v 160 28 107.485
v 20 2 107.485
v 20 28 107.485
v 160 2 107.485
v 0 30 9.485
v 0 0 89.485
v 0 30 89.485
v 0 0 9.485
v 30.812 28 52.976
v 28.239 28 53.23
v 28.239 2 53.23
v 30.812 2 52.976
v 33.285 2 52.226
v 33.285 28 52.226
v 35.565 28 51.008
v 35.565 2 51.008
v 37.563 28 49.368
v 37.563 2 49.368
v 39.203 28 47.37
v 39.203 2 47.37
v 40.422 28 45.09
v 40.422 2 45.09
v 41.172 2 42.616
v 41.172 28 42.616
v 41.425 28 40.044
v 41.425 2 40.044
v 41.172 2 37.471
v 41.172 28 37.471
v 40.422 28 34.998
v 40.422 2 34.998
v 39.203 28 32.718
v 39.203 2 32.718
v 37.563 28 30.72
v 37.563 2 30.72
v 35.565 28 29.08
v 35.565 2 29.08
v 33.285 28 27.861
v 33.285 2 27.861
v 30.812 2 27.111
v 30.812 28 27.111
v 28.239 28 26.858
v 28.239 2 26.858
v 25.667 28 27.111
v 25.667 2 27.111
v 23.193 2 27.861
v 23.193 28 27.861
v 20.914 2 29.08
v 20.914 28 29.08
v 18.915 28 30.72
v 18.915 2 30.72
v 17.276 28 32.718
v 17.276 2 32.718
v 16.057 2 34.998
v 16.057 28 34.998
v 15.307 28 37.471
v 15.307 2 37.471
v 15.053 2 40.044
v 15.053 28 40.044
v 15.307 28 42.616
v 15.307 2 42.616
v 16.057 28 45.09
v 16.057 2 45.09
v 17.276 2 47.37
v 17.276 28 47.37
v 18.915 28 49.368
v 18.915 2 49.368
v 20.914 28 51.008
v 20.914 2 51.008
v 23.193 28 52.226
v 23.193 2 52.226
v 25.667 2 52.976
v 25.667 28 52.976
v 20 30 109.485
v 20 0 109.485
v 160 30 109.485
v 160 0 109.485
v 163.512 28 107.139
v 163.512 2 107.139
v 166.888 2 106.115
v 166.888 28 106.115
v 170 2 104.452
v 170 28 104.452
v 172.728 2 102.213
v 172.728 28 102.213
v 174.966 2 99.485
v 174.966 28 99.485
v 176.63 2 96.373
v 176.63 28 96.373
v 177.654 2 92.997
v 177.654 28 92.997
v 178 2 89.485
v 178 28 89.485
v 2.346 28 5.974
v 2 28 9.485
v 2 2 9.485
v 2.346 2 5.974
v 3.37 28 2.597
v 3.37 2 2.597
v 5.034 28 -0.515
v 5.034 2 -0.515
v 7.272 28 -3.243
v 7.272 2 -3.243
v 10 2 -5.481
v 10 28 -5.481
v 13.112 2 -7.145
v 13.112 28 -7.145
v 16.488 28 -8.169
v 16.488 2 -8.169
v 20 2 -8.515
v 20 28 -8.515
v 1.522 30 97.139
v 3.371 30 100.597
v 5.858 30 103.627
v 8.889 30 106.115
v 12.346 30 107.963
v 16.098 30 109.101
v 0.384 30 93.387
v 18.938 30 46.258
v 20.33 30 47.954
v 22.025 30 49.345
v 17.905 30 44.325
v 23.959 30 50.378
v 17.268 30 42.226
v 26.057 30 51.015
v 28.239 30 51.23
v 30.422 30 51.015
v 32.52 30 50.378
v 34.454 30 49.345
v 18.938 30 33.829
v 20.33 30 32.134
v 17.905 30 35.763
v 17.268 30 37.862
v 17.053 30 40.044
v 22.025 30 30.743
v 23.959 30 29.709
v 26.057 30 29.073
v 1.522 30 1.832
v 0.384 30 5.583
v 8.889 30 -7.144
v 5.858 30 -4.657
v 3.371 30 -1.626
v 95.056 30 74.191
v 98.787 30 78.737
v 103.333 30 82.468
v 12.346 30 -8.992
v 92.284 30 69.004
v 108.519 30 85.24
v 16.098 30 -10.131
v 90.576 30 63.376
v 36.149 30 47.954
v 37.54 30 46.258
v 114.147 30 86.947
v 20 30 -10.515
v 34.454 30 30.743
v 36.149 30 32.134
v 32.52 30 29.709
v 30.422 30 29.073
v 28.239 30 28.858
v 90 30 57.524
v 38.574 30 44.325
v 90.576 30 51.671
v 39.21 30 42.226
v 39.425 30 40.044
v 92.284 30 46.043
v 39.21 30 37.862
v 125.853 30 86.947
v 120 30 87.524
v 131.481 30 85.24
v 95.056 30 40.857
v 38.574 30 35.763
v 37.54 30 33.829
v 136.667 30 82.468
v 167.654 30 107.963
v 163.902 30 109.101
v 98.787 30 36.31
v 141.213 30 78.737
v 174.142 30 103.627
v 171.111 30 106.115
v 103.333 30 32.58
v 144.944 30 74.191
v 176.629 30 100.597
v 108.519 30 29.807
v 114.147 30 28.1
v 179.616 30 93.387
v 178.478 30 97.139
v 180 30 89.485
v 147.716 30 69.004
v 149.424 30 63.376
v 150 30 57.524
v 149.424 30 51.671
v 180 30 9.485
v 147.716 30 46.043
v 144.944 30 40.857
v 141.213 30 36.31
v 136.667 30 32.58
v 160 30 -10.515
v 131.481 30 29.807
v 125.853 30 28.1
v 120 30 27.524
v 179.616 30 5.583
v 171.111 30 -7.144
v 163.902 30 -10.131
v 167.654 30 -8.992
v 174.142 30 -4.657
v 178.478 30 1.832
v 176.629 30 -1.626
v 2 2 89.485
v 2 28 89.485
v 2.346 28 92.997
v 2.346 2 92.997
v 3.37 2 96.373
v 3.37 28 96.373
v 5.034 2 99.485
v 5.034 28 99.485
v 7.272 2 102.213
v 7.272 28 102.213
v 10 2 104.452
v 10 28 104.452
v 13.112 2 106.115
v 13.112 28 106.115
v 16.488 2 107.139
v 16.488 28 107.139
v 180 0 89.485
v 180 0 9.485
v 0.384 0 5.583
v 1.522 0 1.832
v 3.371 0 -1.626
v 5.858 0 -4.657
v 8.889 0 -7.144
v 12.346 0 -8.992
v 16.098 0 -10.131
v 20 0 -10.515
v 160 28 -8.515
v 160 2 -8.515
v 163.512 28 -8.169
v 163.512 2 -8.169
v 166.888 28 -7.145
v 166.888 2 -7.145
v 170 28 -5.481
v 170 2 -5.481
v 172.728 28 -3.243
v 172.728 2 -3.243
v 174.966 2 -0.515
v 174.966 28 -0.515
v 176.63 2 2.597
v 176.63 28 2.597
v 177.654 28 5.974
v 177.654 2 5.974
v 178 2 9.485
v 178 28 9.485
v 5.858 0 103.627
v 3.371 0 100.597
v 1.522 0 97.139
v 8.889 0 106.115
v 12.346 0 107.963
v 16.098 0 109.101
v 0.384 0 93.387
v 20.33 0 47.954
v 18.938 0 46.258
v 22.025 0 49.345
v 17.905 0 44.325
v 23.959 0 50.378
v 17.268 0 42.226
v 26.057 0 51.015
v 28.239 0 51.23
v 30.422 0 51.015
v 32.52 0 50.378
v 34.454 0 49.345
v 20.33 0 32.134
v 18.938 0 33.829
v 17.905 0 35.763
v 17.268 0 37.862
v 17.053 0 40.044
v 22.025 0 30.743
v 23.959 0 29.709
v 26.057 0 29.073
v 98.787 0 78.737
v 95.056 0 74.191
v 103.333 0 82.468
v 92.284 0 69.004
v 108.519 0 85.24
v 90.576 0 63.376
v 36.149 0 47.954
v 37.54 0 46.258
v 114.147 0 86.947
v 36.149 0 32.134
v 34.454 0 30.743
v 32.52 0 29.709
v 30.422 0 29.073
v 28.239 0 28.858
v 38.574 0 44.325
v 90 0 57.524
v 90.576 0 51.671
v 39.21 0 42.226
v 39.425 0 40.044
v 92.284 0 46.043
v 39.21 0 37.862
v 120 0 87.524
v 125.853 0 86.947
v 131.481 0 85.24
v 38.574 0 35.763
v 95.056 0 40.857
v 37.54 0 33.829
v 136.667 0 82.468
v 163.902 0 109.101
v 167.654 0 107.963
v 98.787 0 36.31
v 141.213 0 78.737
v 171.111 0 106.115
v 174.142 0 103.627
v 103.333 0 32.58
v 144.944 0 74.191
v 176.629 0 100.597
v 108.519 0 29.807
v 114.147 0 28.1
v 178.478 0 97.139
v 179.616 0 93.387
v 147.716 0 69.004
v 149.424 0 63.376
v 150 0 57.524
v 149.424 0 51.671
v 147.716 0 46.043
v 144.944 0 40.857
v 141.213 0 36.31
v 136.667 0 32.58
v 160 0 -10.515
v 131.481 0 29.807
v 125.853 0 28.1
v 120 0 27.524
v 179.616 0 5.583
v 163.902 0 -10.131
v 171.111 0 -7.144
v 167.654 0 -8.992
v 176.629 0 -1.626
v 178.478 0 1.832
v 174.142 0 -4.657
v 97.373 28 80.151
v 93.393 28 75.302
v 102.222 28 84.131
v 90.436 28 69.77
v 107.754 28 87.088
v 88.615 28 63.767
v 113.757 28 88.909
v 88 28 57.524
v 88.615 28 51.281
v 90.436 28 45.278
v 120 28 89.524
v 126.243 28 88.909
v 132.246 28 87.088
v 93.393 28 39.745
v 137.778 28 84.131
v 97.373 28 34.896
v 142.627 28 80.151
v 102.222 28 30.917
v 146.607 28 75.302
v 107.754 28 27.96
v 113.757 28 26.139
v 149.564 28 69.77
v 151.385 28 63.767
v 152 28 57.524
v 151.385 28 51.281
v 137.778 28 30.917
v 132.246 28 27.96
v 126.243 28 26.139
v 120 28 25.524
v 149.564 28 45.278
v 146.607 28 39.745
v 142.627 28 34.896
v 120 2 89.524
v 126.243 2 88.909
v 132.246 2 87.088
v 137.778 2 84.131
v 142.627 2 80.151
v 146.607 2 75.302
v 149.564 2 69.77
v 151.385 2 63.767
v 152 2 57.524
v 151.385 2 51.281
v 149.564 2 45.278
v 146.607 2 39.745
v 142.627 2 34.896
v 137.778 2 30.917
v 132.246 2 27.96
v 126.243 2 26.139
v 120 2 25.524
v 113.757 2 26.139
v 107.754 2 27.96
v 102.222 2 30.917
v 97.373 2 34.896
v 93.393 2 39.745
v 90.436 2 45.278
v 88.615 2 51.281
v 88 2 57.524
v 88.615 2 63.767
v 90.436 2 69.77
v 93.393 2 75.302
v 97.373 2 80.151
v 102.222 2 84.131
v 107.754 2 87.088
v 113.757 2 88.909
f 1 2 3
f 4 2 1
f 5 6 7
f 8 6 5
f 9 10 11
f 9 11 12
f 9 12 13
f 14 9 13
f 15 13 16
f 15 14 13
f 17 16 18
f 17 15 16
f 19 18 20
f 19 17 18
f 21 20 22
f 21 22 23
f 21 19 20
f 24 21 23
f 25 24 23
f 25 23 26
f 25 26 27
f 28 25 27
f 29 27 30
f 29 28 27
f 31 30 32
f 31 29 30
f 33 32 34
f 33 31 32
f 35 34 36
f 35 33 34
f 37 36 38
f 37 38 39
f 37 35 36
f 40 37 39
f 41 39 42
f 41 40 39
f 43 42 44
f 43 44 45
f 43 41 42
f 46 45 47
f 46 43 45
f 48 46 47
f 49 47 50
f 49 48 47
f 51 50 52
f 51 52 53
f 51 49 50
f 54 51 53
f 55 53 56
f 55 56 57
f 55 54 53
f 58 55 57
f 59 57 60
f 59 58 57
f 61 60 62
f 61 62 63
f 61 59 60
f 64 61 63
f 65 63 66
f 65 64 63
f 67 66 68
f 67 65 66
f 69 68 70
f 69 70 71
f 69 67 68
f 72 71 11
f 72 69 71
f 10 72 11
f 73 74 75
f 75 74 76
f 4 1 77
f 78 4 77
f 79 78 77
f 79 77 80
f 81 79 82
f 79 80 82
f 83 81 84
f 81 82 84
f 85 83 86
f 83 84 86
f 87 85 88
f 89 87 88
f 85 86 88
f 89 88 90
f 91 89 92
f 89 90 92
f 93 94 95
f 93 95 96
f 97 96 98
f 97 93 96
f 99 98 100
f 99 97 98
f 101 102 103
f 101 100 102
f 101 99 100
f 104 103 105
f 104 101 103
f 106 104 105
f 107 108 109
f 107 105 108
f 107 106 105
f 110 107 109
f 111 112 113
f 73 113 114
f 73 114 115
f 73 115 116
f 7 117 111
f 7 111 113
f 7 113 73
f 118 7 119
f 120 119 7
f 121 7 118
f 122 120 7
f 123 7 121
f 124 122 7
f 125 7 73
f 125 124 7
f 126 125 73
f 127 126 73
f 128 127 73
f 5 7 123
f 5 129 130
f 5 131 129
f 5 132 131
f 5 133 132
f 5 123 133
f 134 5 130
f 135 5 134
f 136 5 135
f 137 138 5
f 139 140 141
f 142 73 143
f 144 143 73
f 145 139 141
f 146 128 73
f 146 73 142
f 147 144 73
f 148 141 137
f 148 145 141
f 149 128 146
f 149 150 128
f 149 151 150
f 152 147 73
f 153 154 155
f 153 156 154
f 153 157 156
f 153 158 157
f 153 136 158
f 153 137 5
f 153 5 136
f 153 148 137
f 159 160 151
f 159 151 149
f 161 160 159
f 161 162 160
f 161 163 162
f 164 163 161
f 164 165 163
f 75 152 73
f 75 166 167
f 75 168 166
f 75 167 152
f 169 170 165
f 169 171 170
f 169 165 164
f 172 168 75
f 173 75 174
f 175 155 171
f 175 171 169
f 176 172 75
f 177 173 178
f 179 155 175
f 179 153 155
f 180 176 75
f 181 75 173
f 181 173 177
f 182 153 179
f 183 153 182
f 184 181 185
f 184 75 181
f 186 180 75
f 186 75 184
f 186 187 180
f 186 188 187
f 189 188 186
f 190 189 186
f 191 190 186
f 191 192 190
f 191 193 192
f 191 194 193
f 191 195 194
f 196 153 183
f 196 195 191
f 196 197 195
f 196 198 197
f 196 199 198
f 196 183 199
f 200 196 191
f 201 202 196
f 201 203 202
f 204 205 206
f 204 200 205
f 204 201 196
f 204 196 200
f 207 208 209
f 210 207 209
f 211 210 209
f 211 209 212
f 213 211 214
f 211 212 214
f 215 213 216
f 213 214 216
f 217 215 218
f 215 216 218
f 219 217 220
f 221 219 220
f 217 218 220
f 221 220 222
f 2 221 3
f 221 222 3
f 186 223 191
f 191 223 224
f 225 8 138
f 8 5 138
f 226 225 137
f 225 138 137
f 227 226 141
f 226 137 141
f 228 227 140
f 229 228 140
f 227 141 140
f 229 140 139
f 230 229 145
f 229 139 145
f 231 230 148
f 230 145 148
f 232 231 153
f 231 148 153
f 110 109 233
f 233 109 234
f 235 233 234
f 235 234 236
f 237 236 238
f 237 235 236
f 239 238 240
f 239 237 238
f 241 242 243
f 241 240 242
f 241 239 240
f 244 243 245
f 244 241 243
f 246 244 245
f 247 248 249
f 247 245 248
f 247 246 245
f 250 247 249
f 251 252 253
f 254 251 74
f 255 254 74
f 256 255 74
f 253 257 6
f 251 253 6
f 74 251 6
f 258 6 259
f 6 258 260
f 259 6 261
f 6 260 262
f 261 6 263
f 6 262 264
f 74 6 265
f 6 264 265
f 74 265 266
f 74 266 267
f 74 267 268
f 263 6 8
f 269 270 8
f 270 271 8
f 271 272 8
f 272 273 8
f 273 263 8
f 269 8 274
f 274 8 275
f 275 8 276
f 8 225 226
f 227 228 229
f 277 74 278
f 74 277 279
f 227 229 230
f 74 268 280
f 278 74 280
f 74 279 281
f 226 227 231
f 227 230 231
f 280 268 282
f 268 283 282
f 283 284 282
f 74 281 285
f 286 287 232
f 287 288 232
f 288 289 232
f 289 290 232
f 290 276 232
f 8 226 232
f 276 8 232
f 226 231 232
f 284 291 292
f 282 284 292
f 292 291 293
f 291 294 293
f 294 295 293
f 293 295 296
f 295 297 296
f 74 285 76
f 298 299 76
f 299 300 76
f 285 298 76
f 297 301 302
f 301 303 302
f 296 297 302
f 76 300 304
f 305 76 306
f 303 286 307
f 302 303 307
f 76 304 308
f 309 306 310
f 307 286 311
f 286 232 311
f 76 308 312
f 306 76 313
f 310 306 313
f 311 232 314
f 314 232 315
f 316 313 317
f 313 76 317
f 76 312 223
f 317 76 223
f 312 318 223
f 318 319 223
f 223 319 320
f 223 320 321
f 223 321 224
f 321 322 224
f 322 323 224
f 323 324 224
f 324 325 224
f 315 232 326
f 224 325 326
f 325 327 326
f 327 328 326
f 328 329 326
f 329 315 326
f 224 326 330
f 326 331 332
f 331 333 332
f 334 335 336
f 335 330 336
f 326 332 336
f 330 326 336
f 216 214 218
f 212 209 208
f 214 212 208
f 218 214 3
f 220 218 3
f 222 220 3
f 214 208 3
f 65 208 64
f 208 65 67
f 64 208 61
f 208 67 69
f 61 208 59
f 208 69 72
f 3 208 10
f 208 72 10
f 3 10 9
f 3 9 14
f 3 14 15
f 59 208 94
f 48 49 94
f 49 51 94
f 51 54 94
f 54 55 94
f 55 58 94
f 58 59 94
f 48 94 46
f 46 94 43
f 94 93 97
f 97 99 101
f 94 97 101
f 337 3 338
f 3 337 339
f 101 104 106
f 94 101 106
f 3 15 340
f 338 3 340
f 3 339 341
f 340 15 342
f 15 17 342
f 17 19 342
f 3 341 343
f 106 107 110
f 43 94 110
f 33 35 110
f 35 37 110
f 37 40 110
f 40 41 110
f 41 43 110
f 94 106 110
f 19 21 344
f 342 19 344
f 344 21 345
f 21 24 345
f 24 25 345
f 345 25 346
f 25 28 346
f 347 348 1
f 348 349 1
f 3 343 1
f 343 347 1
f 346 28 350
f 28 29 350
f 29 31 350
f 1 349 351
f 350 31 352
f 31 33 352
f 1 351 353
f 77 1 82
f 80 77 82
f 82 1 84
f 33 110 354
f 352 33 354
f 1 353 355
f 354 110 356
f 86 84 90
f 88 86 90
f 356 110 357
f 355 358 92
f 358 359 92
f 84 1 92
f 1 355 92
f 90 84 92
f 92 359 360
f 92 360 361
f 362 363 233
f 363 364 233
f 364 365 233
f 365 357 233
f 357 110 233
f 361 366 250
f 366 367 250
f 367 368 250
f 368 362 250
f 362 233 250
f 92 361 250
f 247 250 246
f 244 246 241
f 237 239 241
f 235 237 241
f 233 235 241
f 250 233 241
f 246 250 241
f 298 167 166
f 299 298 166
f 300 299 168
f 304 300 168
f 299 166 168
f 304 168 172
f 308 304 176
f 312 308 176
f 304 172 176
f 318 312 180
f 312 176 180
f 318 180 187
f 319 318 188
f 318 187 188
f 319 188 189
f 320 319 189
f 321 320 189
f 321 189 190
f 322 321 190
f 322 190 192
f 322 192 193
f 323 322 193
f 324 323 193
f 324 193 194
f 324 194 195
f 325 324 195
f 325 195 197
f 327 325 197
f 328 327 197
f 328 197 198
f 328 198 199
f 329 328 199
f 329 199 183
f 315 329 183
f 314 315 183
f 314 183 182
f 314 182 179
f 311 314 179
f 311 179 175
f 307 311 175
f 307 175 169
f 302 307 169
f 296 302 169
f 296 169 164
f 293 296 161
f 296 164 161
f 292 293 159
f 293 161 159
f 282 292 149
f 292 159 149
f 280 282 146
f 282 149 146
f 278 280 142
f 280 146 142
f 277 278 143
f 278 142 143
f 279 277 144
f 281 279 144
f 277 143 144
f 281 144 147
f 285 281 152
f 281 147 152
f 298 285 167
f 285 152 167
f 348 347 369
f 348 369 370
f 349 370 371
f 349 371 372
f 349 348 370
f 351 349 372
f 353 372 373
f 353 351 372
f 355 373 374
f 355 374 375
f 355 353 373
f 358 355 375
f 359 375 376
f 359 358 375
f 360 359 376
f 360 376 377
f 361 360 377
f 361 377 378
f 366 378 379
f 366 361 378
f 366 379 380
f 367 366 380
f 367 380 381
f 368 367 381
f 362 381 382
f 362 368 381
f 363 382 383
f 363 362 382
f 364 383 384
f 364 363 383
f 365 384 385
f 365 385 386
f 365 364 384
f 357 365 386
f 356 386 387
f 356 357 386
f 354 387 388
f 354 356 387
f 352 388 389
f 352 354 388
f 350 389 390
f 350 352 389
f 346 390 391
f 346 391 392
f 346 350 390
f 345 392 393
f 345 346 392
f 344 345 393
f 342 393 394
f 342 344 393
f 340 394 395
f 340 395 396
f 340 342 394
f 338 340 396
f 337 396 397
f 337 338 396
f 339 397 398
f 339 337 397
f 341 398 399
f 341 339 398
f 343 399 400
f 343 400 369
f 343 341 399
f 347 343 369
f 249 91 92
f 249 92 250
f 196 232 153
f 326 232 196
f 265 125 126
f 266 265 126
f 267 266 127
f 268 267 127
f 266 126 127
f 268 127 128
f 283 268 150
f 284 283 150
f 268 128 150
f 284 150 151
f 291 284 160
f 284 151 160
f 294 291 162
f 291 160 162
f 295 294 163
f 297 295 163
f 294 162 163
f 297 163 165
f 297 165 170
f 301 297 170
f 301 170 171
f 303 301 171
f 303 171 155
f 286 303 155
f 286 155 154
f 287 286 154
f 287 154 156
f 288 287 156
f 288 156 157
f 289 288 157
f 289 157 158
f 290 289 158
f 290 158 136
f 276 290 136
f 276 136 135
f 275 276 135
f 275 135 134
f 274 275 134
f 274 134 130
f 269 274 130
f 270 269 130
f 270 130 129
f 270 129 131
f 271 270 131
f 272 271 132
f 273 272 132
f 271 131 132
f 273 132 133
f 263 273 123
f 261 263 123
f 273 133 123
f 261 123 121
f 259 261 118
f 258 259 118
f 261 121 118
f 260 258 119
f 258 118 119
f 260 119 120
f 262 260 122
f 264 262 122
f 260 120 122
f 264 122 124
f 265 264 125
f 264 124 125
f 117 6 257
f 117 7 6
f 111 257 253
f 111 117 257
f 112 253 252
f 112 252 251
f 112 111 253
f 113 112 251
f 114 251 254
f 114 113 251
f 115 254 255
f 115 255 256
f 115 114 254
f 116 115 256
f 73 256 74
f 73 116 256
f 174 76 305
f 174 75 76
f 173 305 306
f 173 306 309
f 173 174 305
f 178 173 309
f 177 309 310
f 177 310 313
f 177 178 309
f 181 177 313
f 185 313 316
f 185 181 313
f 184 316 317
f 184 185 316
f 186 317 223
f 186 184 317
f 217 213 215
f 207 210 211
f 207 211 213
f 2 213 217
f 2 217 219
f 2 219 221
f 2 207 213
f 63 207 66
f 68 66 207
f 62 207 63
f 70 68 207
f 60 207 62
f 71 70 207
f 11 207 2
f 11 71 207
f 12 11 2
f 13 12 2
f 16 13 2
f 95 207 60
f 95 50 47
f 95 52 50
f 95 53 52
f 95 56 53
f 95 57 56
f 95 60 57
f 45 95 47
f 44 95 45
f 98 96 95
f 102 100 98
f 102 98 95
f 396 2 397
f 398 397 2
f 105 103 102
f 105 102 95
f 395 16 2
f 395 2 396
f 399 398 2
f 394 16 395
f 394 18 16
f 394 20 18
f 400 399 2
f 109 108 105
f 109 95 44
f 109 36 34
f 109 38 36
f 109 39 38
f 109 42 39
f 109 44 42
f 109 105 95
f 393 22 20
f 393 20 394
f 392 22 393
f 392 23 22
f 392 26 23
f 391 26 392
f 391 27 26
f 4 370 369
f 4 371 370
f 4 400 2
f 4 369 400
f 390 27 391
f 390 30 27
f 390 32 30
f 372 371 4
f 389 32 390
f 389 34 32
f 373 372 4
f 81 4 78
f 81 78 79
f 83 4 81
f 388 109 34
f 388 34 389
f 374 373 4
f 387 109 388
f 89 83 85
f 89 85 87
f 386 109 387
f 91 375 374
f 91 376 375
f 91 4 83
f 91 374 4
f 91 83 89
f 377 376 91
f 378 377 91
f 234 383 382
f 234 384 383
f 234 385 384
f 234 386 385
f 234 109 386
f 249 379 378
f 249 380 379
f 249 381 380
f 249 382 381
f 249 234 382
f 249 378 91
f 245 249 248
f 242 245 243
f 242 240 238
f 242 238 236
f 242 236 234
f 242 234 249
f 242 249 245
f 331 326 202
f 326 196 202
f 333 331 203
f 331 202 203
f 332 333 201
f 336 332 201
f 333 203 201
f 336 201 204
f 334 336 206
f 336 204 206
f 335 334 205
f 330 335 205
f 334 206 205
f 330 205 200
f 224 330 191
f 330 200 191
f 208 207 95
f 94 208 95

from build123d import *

# Parameters (mm, degrees)
SKETCH_1_W          = 180
SKETCH_1_H          = 120
EXTRUDE_2_DEPTH     = 30
SKETCH_3_R          = 30
SKETCH_3_R_2        = 11.186038902
CUT_EXTRUDE_1_DEPTH = 213.807433918
FILLET_1_R          = 20
SHELL_1_T           = 2


with BuildPart() as part:
    # 草图1 → 凸台-拉伸2 (new body)
    with BuildSketch(Plane(origin=(0, 0, 0), x_dir=(1, 0, 0), z_dir=(0, 1, 0))):
        with Locations((90, -49.485176763)):
            Rectangle(SKETCH_1_W, SKETCH_1_H)
    extrude(amount=EXTRUDE_2_DEPTH)

    # 草图3 → 切除-拉伸1 (cut, through all)
    with BuildSketch(Plane(origin=(0, 30, 0), x_dir=(1, 0, 0), z_dir=(0, 1, 0))):
        with Locations(Location((120, -57.523652535, 0), (0, 0, 270))):
            Circle(SKETCH_3_R)
        with Locations(Location((28.239340808, -40.043809648, 0), (0, 0, 270))):
            Circle(SKETCH_3_R_2)
    extrude(amount=-CUT_EXTRUDE_1_DEPTH, mode=Mode.SUBTRACT)

    # 圆角1
    fillet_1_edges = [part.edges().sort_by_distance(p)[0] for p in [
        (0, 15, -10.514823237),
        (180, 15, -10.514823237),
        (180, 15, 109.485176763),
        (0, 15, 109.485176763),
    ]]
    fillet(fillet_1_edges, radius=FILLET_1_R)

    # 抽壳1 (no face opened: a closed hollow body)
    add(offset(amount=-SHELL_1_T, mode=Mode.PRIVATE), mode=Mode.SUBTRACT)


solid = part.part
